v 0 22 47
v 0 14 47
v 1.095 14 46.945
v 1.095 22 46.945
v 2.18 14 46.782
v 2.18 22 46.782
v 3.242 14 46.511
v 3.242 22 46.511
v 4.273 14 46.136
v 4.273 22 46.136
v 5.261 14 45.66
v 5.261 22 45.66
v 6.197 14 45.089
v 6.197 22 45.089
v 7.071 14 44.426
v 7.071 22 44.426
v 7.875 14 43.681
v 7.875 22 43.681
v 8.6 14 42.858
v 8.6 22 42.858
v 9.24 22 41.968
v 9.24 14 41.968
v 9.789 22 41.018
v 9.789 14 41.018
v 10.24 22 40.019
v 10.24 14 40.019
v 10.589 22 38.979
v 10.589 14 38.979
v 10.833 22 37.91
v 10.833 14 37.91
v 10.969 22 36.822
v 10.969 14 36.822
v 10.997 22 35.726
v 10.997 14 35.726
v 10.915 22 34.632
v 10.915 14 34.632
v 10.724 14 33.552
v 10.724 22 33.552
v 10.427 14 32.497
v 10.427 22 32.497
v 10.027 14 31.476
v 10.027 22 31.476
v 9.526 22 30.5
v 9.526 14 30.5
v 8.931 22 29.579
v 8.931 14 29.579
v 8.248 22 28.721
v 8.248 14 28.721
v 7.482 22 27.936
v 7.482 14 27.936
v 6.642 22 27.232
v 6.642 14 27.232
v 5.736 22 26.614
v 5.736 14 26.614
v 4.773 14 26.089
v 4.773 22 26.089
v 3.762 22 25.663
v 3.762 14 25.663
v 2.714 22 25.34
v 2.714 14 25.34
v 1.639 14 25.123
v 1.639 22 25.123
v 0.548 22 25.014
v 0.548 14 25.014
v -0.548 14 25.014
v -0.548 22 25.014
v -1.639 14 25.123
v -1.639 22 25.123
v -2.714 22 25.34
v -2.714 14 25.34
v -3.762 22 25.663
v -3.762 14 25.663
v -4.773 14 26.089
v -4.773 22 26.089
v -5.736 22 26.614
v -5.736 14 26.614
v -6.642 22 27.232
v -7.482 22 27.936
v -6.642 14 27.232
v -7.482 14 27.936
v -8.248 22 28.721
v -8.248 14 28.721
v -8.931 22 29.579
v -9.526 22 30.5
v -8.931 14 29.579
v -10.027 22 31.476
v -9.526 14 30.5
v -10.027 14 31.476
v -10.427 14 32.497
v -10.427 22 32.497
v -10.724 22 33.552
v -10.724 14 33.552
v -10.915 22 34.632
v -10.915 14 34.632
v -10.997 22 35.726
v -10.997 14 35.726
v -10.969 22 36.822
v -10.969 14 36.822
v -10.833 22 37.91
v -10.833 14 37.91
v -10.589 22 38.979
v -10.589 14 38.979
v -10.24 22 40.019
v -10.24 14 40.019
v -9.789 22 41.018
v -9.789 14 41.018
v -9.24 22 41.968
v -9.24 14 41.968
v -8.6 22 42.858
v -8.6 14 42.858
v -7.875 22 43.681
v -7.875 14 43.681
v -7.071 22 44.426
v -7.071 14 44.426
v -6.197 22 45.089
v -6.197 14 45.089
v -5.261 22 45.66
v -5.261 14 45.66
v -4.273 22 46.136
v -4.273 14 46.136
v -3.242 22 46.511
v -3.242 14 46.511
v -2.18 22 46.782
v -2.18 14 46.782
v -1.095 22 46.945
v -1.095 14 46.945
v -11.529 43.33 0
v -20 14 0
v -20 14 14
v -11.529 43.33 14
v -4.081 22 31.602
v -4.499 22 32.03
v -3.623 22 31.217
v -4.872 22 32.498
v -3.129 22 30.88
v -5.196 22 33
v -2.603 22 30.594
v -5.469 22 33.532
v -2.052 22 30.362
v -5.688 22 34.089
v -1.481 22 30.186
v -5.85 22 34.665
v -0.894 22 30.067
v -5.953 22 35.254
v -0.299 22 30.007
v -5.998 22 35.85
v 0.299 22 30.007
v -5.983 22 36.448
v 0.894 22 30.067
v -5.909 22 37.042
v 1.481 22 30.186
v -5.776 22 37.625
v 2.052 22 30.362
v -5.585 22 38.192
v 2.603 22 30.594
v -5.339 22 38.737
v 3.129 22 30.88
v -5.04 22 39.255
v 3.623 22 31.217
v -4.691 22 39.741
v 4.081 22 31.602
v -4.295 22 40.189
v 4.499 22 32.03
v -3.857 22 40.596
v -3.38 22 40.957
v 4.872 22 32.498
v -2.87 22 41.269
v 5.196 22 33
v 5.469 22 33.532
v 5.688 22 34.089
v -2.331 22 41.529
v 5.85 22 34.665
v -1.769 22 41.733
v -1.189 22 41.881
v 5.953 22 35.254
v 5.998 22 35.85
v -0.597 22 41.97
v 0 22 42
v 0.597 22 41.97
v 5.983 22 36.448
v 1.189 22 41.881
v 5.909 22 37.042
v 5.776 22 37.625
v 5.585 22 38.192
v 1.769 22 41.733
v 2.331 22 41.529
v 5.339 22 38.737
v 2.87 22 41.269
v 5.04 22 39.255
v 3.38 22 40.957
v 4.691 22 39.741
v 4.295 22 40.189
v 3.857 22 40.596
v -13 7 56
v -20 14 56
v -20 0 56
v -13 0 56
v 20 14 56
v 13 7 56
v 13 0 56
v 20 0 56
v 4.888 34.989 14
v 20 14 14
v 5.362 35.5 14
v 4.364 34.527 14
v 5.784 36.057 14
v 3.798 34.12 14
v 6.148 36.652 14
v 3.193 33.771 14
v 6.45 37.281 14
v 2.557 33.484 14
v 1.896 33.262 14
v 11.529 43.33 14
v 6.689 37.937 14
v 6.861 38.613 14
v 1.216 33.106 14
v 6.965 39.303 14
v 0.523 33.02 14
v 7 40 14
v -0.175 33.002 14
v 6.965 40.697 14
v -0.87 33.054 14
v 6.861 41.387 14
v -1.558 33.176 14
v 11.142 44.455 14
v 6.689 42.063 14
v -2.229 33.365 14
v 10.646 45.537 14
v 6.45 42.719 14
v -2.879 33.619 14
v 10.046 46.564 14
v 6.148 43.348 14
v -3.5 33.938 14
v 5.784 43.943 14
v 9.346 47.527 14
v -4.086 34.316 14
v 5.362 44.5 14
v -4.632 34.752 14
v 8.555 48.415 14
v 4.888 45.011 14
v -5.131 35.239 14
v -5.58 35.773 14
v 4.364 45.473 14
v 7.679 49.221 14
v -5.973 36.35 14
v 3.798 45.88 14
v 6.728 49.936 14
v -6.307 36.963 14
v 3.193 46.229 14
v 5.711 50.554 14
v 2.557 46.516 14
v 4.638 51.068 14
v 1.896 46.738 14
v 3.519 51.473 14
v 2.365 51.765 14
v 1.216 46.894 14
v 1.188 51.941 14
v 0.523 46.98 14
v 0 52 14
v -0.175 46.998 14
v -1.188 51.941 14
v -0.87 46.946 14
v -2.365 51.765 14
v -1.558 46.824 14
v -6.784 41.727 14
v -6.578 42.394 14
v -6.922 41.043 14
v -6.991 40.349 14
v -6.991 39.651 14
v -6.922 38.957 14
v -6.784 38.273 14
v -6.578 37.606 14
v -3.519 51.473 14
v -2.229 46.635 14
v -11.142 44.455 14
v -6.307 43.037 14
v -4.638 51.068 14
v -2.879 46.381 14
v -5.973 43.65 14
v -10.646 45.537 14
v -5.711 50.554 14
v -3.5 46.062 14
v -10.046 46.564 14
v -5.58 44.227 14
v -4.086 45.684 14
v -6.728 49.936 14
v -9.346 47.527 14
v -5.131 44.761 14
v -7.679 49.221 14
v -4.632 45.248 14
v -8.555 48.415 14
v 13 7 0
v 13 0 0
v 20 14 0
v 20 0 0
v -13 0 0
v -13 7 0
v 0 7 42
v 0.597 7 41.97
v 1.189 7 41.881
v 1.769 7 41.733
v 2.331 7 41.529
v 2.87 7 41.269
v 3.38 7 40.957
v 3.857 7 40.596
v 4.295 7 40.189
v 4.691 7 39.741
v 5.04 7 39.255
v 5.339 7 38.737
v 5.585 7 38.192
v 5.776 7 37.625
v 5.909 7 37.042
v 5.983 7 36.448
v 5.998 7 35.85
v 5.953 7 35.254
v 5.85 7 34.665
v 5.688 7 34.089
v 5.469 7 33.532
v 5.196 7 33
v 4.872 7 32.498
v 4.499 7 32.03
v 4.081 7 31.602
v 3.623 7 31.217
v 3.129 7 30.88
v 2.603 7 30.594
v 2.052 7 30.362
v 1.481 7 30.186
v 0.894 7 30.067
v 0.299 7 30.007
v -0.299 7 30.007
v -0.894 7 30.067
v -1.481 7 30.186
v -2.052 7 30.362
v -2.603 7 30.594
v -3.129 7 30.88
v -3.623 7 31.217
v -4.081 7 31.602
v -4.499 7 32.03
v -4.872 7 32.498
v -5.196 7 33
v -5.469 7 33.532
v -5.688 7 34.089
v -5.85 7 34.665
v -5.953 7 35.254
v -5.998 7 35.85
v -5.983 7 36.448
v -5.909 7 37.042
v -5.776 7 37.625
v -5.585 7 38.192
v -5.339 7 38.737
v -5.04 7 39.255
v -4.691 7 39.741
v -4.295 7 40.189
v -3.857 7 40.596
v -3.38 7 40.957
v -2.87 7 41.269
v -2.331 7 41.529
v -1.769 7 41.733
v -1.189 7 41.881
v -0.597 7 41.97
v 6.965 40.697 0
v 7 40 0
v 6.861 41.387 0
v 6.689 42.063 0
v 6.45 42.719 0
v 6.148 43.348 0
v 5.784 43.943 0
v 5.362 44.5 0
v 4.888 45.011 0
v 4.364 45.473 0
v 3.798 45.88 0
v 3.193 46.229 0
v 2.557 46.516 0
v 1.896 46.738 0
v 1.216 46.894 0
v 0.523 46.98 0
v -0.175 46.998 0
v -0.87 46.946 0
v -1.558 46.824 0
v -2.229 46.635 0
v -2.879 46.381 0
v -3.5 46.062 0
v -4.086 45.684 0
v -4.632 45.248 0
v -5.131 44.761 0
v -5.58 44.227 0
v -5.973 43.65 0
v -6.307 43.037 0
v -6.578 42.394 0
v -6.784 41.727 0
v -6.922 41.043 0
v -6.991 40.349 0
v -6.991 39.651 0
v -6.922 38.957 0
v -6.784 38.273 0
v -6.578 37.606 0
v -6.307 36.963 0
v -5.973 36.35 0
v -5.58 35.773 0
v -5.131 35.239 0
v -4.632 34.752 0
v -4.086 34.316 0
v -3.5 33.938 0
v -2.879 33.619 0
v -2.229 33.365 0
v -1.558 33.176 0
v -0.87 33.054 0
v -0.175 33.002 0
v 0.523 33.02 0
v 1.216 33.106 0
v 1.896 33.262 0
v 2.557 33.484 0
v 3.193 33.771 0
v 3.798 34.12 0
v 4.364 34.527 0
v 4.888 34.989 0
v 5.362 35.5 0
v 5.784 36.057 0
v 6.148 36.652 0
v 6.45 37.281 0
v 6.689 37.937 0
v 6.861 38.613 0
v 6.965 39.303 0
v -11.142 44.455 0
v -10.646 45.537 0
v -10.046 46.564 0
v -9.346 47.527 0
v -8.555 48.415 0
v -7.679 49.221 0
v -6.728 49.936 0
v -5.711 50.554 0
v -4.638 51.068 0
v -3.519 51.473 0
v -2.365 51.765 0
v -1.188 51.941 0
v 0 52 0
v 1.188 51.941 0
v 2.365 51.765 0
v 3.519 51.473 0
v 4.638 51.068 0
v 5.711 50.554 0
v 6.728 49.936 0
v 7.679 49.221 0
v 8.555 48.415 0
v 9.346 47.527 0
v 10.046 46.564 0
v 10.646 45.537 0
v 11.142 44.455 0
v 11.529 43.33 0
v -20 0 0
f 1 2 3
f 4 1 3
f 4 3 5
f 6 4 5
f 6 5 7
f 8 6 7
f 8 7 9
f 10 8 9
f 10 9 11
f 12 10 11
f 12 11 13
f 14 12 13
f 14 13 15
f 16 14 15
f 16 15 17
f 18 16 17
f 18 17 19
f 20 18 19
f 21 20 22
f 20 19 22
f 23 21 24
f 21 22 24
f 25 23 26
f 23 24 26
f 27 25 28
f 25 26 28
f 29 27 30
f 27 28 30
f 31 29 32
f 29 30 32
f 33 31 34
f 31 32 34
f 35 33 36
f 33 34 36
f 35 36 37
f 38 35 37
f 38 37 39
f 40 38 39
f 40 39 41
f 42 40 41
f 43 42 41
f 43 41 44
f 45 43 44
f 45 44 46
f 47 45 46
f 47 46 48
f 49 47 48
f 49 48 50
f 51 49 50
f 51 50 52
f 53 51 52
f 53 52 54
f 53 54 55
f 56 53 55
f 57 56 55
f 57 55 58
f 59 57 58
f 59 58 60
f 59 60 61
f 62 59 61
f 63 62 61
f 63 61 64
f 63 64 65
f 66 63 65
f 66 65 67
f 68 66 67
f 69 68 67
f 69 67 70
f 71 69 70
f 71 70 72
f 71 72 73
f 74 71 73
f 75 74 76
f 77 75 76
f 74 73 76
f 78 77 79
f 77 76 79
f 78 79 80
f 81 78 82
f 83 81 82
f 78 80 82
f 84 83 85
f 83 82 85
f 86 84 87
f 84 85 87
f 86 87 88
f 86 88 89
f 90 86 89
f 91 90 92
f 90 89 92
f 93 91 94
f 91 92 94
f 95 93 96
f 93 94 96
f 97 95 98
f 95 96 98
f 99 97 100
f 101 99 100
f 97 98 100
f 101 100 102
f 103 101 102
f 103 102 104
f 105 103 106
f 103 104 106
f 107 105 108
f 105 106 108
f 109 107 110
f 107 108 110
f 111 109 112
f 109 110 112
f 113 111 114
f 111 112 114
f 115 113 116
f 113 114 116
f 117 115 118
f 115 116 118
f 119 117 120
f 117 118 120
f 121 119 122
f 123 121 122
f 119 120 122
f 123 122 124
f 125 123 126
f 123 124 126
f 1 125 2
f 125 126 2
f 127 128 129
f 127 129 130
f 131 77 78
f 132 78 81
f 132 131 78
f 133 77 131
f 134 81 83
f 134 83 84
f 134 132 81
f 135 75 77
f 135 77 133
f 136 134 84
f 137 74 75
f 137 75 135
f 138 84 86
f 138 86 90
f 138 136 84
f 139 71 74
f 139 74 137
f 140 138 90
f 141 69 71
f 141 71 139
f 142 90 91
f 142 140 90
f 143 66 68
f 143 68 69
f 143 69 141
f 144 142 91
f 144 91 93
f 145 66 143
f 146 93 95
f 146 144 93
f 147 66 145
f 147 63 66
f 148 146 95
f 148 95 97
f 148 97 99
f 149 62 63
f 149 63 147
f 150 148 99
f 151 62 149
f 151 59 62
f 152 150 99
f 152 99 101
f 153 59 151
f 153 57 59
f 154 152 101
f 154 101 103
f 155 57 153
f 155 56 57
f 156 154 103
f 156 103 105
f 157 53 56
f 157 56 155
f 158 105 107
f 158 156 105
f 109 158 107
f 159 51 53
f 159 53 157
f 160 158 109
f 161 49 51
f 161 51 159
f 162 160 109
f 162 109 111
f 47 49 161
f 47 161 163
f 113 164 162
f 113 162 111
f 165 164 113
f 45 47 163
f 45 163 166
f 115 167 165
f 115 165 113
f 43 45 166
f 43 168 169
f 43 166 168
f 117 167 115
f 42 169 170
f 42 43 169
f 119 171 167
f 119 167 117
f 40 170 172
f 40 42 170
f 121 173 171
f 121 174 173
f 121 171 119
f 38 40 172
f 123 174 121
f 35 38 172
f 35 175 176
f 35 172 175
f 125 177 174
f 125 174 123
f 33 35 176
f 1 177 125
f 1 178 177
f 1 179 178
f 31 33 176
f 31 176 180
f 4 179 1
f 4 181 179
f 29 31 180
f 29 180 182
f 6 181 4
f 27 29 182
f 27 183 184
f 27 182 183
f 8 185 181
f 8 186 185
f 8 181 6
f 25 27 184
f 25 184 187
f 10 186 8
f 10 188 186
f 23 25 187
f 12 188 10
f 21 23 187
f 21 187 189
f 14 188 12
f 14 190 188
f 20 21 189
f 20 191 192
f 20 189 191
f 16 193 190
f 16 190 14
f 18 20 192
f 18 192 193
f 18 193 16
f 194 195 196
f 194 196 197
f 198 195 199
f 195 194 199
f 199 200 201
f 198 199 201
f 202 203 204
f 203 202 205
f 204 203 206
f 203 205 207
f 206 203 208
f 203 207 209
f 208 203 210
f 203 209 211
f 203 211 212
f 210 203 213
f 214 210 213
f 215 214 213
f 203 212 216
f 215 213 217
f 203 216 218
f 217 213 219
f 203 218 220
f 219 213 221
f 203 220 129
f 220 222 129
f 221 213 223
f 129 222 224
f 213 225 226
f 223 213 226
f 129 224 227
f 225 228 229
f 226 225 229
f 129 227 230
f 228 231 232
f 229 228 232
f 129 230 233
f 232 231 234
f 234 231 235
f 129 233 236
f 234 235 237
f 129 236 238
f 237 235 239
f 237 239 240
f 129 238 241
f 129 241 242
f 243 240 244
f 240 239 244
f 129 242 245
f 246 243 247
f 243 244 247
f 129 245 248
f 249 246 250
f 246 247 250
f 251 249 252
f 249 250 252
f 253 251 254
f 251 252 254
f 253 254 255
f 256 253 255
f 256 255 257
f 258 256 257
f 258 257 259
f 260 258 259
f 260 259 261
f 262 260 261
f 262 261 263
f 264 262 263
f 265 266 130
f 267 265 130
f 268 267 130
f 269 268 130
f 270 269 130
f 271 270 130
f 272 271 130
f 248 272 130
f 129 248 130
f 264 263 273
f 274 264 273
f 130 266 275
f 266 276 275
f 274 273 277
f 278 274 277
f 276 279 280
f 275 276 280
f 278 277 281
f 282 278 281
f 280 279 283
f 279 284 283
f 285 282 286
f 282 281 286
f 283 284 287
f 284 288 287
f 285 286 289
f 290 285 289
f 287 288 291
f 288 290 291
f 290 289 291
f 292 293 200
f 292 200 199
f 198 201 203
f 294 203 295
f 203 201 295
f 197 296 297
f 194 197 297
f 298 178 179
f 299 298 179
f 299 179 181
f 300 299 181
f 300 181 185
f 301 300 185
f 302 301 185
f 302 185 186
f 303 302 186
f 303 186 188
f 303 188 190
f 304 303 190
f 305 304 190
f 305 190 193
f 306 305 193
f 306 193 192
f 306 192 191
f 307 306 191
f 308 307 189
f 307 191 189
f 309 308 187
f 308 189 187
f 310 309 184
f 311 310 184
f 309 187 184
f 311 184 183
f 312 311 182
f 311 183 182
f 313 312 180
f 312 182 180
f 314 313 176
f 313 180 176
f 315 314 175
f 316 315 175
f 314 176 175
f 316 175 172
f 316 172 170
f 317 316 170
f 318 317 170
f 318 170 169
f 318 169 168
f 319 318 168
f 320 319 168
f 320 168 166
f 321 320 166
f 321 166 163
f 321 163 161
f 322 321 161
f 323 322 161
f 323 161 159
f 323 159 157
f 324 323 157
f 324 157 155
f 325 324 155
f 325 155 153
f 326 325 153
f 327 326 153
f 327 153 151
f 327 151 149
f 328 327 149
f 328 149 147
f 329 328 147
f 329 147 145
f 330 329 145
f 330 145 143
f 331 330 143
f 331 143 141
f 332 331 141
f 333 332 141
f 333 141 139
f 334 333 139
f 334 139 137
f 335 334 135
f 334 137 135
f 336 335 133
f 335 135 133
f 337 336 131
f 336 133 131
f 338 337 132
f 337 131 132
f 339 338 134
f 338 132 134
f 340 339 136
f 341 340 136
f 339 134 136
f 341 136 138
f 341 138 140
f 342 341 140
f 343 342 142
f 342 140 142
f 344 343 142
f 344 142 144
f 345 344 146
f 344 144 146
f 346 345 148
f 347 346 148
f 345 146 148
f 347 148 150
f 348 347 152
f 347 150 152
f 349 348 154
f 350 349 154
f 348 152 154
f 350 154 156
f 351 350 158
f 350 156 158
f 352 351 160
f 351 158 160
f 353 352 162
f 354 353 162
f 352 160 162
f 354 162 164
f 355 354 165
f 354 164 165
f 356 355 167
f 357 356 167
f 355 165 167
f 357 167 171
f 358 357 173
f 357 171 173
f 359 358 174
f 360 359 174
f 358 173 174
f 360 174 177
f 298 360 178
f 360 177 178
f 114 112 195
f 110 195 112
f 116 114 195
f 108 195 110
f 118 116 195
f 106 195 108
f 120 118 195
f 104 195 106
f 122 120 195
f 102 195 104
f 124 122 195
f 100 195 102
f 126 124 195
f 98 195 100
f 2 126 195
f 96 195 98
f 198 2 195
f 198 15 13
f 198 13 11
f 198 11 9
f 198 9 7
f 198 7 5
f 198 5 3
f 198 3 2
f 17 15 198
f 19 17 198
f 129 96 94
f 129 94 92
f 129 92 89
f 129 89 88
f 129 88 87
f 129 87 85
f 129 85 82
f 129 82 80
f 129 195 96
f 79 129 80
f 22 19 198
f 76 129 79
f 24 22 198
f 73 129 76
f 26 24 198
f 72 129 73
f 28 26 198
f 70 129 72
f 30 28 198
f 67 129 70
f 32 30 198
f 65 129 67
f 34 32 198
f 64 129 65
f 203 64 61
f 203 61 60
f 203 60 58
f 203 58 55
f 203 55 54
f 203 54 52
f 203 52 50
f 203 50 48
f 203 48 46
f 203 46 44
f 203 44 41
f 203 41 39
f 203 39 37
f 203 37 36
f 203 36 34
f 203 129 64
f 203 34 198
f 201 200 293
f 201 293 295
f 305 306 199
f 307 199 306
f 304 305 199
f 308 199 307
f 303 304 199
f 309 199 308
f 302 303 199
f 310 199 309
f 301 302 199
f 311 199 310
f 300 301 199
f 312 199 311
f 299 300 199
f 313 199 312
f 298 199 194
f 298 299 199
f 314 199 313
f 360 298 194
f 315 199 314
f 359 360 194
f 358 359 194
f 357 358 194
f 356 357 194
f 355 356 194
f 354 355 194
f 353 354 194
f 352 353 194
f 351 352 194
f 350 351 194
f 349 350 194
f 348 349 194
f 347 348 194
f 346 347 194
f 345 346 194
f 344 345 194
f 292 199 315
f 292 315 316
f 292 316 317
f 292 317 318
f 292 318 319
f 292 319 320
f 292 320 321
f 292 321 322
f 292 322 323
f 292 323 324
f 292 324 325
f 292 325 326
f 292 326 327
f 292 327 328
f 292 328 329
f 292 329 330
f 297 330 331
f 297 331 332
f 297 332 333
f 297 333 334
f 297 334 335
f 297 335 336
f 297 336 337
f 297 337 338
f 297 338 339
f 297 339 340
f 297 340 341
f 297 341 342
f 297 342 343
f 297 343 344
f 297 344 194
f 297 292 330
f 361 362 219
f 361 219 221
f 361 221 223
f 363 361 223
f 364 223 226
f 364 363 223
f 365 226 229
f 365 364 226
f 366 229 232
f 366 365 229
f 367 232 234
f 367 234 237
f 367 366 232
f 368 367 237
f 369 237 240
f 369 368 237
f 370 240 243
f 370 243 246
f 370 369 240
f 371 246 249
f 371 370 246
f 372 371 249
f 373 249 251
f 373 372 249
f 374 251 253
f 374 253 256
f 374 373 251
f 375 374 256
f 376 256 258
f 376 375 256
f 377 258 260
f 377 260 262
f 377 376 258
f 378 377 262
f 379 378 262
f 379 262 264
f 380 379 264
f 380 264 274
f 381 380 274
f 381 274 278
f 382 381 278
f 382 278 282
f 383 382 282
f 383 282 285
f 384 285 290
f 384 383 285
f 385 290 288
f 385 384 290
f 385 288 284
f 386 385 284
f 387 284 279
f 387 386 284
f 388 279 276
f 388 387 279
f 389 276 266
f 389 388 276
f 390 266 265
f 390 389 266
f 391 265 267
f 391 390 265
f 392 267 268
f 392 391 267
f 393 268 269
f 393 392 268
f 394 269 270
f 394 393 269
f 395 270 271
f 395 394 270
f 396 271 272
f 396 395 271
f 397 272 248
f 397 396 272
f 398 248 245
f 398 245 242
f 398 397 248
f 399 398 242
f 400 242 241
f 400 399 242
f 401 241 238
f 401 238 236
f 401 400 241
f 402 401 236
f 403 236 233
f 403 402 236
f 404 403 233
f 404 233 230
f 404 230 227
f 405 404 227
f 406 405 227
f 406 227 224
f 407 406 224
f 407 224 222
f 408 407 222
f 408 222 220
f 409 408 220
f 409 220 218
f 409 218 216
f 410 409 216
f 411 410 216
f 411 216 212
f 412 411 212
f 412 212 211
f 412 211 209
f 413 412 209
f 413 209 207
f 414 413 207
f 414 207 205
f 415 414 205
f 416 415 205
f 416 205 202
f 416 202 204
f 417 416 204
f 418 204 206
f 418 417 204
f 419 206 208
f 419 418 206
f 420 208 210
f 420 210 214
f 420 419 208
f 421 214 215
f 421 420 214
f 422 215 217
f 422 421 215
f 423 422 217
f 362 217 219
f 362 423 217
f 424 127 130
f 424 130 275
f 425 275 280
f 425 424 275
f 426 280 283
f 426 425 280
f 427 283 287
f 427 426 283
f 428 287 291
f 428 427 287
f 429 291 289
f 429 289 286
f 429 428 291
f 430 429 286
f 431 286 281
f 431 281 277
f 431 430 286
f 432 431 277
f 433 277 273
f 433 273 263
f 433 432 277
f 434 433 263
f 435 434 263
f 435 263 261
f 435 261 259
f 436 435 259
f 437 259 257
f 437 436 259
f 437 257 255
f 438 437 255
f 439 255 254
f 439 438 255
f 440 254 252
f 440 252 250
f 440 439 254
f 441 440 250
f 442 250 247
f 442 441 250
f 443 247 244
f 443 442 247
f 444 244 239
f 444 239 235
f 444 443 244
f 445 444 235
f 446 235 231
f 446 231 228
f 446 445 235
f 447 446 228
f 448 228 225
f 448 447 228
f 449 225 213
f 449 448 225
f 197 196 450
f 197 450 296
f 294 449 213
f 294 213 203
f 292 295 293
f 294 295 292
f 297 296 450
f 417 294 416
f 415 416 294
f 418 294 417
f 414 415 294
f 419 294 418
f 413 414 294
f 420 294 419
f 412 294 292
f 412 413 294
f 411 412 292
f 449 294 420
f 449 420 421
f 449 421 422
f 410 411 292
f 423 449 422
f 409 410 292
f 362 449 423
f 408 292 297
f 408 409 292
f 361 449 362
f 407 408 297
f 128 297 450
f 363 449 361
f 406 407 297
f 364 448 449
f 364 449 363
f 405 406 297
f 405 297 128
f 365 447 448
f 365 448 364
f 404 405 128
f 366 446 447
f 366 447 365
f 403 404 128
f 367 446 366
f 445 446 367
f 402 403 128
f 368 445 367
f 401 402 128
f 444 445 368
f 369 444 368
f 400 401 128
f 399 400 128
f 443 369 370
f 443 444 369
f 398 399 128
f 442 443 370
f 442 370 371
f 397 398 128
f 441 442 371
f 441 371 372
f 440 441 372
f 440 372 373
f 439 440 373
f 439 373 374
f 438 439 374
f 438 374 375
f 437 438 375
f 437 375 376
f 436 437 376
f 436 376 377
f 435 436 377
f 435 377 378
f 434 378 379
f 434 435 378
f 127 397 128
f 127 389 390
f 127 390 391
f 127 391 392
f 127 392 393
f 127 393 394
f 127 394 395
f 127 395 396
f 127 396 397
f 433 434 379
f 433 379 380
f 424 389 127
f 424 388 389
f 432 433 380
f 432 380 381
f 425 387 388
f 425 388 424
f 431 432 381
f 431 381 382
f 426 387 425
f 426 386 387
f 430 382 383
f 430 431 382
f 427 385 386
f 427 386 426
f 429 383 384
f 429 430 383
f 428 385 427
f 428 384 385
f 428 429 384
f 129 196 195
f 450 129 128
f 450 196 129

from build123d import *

# Parameters (mm, degrees)
SKETCH1_W                = 40
SKETCH1_H                = 56
BOSS_EXTRUDE1_DEPTH      = 14
SKETCH5_W                = 13
SKETCH5_H                = 7
CUT_EXTRUDE1_DEPTH       = 68
SKETCH7_R                = 7
BOSS_EXTRUDE2_DEPTH      = 14
BOSS_EXTRUDE3_DEPTH      = 8
BOSS_EXTRUDE3_DEPTH_BACK = 1
SKETCH8_R                = 11
SKETCH9_R                = 6
CUT_EXTRUDE2_DEPTH       = 44


with BuildPart() as part:
    # Sketch1 → Boss-Extrude1 (new body)
    with BuildSketch(Plane(origin=(0, 0, 0), x_dir=(1, 0, 0), z_dir=(0, 1, 0))):
        with Locations((0, -28)):
            Rectangle(SKETCH1_W, SKETCH1_H)
    extrude(amount=BOSS_EXTRUDE1_DEPTH)

    # Sketch5 → Cut-Extrude1 (cut)
    with BuildSketch(Plane.XY):
        with Locations((6.5, 3.5)):
            Rectangle(SKETCH5_W, SKETCH5_H)
        with Locations((-6.5, 3.5)):
            Rectangle(SKETCH5_W, SKETCH5_H)
    extrude(amount=CUT_EXTRUDE1_DEPTH, mode=Mode.SUBTRACT)

    # Sketch7 → Boss-Extrude2 (add)
    with BuildSketch(Plane.XY):
        with BuildLine():
            Line((20, 14), (-20, 14))
            Line((-20, 14), (-11.528805322, 43.329811826))
            ThreePointArc((-11.528805322, 43.329811826), (0, 52.000041623), (11.528805322, 43.329811826))
            Line((11.528805322, 43.329811826), (20, 14))
        make_face()
        with Locations((0, 40)):
            Circle(SKETCH7_R, mode=Mode.SUBTRACT)
    extrude(amount=BOSS_EXTRUDE2_DEPTH)

    # Sketch8 → Boss-Extrude3 (add, two sides: drawn at the far end of the back side and taken through both)
    with BuildSketch(Plane(origin=(0, 14, 0), x_dir=(1, 0, 0), z_dir=(0, 1, 0)).offset(-BOSS_EXTRUDE3_DEPTH_BACK)):
        with Locations(Location((0, -36, 0), (0, 0, 270))):
            Circle(SKETCH8_R)
    extrude(amount=BOSS_EXTRUDE3_DEPTH + BOSS_EXTRUDE3_DEPTH_BACK)

    # Sketch9 → Cut-Extrude2 (cut)
    with BuildSketch(Plane(origin=(0, 22, 0), x_dir=(1, 0, 0), z_dir=(0, 1, 0))):
        with Locations(Location((0, -36, 0), (0, 0, 270))):
            Circle(SKETCH9_R)
    extrude(amount=-CUT_EXTRUDE2_DEPTH, mode=Mode.SUBTRACT)


solid = part.part
